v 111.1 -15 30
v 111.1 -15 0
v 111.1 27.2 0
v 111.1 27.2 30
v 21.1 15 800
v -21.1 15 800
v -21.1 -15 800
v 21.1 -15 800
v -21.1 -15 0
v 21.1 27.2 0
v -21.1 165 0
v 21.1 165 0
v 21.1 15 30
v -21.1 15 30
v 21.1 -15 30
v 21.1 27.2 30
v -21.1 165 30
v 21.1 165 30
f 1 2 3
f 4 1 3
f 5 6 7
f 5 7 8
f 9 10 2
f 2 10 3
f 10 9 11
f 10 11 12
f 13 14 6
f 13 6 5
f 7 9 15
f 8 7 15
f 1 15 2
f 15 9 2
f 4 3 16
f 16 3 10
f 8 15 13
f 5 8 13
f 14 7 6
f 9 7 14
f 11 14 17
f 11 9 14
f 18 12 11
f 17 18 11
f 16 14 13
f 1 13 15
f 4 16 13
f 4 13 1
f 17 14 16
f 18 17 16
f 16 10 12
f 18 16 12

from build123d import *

# Parameters (mm, degrees)
F0_W     = 42.2
F0_H     = 30
F1_DEPTH = 800
F2_DEPTH = 30


with BuildPart() as f1:
    # F0 (on Top) → F1 (new body)
    with BuildSketch(Plane.XY):
        Rectangle(F0_W, F0_H)
    extrude(amount=F1_DEPTH)

    # F0 (on Top) → F2 (join)
    with BuildSketch(Plane.XY):
        Polygon((21.1, 15), (21.1, -15), (111.1, -15), (111.1, 27.2), (21.1, 27.2), align=None)
        Polygon((-21.1, 15), (21.1, 15), (21.1, 27.2), (21.1, 165), (-21.1, 165), align=None)
    extrude(amount=F2_DEPTH)


solid = f1.part
